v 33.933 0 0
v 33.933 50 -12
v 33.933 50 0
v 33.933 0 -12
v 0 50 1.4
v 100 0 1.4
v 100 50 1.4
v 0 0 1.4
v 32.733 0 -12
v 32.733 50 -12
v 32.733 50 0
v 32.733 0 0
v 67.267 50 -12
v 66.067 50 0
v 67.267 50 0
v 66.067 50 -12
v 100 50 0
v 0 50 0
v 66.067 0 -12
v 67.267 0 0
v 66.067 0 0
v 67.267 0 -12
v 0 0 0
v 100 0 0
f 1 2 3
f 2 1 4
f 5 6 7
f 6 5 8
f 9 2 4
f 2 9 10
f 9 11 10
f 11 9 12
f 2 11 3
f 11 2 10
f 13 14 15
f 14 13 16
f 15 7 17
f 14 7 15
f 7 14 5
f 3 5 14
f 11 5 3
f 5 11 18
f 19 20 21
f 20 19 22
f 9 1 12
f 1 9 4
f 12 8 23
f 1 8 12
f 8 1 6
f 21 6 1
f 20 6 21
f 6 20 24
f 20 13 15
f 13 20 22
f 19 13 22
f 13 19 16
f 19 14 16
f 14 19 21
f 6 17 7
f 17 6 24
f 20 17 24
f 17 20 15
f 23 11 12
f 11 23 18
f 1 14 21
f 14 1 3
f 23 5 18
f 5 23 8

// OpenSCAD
$fn = 32;

// ----------------------------------------------------------------------
// Ribbed panel: 1.4 mm panel
// ----------------------------------------------------------------------

// --- parameters (mm) ---
panel_l = 100;            // panel length, X
panel_w = 50;             // panel width, Y
panel_t = 1.4;            // panel thickness, Z
rib_t = 1.2;              // rib thickness
rib_h = 12;               // rib height below the panel
ribs = 2;                 // number of ribs

total_h = panel_t + rib_h;  // overall height

union() {
  cube([panel_l, panel_w, panel_t]);
  for (i = [1 : ribs])
    translate([i * panel_l / (ribs + 1) - rib_t / 2, 0, -rib_h])
      cube([rib_t, panel_w, rib_h + panel_t]);
}
